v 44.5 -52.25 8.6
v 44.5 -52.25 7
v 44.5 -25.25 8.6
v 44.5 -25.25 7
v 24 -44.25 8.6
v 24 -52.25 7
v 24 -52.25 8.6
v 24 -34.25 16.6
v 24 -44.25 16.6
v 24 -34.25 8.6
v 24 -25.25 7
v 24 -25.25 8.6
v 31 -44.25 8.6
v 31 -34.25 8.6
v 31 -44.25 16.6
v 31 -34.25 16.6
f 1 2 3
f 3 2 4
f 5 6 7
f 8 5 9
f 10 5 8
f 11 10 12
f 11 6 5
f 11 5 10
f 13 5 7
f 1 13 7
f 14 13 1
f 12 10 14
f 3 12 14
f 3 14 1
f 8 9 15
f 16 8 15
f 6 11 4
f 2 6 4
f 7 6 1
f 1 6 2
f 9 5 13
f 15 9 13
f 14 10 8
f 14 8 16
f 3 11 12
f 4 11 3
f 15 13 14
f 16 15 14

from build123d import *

# Parameters (mm, degrees)
BOX004_W     = 7
BOX004_H     = 10
BOX004_DEPTH = 8
BOX003_W     = 20.5
BOX003_H     = 27
BOX003_DEPTH = 1.6


with BuildPart() as cube004:
    # Box004 → Box004 (new body)
    with BuildSketch(Plane(origin=(0, 8, 1.6), x_dir=(1, 0, 0), z_dir=(0, 0, 1))):
        with Locations((3.5, 5)):
            Rectangle(BOX004_W, BOX004_H)
    extrude(amount=BOX004_DEPTH)


with BuildPart() as imu_pcb001:
    # Box003 → Box003 (new body)
    with BuildSketch(Plane.XY):
        with Locations((10.25, 13.5)):
            Rectangle(BOX003_W, BOX003_H)
    extrude(amount=BOX003_DEPTH)

    # Fusion001: union Cube004
    add(cube004.part)


with BuildPart() as imu_pcb001_1:
    # Fusion001 placement: moved
    add(imu_pcb001.part.moved(Location((24, -52.25, 7))))


solid = imu_pcb001_1.part
